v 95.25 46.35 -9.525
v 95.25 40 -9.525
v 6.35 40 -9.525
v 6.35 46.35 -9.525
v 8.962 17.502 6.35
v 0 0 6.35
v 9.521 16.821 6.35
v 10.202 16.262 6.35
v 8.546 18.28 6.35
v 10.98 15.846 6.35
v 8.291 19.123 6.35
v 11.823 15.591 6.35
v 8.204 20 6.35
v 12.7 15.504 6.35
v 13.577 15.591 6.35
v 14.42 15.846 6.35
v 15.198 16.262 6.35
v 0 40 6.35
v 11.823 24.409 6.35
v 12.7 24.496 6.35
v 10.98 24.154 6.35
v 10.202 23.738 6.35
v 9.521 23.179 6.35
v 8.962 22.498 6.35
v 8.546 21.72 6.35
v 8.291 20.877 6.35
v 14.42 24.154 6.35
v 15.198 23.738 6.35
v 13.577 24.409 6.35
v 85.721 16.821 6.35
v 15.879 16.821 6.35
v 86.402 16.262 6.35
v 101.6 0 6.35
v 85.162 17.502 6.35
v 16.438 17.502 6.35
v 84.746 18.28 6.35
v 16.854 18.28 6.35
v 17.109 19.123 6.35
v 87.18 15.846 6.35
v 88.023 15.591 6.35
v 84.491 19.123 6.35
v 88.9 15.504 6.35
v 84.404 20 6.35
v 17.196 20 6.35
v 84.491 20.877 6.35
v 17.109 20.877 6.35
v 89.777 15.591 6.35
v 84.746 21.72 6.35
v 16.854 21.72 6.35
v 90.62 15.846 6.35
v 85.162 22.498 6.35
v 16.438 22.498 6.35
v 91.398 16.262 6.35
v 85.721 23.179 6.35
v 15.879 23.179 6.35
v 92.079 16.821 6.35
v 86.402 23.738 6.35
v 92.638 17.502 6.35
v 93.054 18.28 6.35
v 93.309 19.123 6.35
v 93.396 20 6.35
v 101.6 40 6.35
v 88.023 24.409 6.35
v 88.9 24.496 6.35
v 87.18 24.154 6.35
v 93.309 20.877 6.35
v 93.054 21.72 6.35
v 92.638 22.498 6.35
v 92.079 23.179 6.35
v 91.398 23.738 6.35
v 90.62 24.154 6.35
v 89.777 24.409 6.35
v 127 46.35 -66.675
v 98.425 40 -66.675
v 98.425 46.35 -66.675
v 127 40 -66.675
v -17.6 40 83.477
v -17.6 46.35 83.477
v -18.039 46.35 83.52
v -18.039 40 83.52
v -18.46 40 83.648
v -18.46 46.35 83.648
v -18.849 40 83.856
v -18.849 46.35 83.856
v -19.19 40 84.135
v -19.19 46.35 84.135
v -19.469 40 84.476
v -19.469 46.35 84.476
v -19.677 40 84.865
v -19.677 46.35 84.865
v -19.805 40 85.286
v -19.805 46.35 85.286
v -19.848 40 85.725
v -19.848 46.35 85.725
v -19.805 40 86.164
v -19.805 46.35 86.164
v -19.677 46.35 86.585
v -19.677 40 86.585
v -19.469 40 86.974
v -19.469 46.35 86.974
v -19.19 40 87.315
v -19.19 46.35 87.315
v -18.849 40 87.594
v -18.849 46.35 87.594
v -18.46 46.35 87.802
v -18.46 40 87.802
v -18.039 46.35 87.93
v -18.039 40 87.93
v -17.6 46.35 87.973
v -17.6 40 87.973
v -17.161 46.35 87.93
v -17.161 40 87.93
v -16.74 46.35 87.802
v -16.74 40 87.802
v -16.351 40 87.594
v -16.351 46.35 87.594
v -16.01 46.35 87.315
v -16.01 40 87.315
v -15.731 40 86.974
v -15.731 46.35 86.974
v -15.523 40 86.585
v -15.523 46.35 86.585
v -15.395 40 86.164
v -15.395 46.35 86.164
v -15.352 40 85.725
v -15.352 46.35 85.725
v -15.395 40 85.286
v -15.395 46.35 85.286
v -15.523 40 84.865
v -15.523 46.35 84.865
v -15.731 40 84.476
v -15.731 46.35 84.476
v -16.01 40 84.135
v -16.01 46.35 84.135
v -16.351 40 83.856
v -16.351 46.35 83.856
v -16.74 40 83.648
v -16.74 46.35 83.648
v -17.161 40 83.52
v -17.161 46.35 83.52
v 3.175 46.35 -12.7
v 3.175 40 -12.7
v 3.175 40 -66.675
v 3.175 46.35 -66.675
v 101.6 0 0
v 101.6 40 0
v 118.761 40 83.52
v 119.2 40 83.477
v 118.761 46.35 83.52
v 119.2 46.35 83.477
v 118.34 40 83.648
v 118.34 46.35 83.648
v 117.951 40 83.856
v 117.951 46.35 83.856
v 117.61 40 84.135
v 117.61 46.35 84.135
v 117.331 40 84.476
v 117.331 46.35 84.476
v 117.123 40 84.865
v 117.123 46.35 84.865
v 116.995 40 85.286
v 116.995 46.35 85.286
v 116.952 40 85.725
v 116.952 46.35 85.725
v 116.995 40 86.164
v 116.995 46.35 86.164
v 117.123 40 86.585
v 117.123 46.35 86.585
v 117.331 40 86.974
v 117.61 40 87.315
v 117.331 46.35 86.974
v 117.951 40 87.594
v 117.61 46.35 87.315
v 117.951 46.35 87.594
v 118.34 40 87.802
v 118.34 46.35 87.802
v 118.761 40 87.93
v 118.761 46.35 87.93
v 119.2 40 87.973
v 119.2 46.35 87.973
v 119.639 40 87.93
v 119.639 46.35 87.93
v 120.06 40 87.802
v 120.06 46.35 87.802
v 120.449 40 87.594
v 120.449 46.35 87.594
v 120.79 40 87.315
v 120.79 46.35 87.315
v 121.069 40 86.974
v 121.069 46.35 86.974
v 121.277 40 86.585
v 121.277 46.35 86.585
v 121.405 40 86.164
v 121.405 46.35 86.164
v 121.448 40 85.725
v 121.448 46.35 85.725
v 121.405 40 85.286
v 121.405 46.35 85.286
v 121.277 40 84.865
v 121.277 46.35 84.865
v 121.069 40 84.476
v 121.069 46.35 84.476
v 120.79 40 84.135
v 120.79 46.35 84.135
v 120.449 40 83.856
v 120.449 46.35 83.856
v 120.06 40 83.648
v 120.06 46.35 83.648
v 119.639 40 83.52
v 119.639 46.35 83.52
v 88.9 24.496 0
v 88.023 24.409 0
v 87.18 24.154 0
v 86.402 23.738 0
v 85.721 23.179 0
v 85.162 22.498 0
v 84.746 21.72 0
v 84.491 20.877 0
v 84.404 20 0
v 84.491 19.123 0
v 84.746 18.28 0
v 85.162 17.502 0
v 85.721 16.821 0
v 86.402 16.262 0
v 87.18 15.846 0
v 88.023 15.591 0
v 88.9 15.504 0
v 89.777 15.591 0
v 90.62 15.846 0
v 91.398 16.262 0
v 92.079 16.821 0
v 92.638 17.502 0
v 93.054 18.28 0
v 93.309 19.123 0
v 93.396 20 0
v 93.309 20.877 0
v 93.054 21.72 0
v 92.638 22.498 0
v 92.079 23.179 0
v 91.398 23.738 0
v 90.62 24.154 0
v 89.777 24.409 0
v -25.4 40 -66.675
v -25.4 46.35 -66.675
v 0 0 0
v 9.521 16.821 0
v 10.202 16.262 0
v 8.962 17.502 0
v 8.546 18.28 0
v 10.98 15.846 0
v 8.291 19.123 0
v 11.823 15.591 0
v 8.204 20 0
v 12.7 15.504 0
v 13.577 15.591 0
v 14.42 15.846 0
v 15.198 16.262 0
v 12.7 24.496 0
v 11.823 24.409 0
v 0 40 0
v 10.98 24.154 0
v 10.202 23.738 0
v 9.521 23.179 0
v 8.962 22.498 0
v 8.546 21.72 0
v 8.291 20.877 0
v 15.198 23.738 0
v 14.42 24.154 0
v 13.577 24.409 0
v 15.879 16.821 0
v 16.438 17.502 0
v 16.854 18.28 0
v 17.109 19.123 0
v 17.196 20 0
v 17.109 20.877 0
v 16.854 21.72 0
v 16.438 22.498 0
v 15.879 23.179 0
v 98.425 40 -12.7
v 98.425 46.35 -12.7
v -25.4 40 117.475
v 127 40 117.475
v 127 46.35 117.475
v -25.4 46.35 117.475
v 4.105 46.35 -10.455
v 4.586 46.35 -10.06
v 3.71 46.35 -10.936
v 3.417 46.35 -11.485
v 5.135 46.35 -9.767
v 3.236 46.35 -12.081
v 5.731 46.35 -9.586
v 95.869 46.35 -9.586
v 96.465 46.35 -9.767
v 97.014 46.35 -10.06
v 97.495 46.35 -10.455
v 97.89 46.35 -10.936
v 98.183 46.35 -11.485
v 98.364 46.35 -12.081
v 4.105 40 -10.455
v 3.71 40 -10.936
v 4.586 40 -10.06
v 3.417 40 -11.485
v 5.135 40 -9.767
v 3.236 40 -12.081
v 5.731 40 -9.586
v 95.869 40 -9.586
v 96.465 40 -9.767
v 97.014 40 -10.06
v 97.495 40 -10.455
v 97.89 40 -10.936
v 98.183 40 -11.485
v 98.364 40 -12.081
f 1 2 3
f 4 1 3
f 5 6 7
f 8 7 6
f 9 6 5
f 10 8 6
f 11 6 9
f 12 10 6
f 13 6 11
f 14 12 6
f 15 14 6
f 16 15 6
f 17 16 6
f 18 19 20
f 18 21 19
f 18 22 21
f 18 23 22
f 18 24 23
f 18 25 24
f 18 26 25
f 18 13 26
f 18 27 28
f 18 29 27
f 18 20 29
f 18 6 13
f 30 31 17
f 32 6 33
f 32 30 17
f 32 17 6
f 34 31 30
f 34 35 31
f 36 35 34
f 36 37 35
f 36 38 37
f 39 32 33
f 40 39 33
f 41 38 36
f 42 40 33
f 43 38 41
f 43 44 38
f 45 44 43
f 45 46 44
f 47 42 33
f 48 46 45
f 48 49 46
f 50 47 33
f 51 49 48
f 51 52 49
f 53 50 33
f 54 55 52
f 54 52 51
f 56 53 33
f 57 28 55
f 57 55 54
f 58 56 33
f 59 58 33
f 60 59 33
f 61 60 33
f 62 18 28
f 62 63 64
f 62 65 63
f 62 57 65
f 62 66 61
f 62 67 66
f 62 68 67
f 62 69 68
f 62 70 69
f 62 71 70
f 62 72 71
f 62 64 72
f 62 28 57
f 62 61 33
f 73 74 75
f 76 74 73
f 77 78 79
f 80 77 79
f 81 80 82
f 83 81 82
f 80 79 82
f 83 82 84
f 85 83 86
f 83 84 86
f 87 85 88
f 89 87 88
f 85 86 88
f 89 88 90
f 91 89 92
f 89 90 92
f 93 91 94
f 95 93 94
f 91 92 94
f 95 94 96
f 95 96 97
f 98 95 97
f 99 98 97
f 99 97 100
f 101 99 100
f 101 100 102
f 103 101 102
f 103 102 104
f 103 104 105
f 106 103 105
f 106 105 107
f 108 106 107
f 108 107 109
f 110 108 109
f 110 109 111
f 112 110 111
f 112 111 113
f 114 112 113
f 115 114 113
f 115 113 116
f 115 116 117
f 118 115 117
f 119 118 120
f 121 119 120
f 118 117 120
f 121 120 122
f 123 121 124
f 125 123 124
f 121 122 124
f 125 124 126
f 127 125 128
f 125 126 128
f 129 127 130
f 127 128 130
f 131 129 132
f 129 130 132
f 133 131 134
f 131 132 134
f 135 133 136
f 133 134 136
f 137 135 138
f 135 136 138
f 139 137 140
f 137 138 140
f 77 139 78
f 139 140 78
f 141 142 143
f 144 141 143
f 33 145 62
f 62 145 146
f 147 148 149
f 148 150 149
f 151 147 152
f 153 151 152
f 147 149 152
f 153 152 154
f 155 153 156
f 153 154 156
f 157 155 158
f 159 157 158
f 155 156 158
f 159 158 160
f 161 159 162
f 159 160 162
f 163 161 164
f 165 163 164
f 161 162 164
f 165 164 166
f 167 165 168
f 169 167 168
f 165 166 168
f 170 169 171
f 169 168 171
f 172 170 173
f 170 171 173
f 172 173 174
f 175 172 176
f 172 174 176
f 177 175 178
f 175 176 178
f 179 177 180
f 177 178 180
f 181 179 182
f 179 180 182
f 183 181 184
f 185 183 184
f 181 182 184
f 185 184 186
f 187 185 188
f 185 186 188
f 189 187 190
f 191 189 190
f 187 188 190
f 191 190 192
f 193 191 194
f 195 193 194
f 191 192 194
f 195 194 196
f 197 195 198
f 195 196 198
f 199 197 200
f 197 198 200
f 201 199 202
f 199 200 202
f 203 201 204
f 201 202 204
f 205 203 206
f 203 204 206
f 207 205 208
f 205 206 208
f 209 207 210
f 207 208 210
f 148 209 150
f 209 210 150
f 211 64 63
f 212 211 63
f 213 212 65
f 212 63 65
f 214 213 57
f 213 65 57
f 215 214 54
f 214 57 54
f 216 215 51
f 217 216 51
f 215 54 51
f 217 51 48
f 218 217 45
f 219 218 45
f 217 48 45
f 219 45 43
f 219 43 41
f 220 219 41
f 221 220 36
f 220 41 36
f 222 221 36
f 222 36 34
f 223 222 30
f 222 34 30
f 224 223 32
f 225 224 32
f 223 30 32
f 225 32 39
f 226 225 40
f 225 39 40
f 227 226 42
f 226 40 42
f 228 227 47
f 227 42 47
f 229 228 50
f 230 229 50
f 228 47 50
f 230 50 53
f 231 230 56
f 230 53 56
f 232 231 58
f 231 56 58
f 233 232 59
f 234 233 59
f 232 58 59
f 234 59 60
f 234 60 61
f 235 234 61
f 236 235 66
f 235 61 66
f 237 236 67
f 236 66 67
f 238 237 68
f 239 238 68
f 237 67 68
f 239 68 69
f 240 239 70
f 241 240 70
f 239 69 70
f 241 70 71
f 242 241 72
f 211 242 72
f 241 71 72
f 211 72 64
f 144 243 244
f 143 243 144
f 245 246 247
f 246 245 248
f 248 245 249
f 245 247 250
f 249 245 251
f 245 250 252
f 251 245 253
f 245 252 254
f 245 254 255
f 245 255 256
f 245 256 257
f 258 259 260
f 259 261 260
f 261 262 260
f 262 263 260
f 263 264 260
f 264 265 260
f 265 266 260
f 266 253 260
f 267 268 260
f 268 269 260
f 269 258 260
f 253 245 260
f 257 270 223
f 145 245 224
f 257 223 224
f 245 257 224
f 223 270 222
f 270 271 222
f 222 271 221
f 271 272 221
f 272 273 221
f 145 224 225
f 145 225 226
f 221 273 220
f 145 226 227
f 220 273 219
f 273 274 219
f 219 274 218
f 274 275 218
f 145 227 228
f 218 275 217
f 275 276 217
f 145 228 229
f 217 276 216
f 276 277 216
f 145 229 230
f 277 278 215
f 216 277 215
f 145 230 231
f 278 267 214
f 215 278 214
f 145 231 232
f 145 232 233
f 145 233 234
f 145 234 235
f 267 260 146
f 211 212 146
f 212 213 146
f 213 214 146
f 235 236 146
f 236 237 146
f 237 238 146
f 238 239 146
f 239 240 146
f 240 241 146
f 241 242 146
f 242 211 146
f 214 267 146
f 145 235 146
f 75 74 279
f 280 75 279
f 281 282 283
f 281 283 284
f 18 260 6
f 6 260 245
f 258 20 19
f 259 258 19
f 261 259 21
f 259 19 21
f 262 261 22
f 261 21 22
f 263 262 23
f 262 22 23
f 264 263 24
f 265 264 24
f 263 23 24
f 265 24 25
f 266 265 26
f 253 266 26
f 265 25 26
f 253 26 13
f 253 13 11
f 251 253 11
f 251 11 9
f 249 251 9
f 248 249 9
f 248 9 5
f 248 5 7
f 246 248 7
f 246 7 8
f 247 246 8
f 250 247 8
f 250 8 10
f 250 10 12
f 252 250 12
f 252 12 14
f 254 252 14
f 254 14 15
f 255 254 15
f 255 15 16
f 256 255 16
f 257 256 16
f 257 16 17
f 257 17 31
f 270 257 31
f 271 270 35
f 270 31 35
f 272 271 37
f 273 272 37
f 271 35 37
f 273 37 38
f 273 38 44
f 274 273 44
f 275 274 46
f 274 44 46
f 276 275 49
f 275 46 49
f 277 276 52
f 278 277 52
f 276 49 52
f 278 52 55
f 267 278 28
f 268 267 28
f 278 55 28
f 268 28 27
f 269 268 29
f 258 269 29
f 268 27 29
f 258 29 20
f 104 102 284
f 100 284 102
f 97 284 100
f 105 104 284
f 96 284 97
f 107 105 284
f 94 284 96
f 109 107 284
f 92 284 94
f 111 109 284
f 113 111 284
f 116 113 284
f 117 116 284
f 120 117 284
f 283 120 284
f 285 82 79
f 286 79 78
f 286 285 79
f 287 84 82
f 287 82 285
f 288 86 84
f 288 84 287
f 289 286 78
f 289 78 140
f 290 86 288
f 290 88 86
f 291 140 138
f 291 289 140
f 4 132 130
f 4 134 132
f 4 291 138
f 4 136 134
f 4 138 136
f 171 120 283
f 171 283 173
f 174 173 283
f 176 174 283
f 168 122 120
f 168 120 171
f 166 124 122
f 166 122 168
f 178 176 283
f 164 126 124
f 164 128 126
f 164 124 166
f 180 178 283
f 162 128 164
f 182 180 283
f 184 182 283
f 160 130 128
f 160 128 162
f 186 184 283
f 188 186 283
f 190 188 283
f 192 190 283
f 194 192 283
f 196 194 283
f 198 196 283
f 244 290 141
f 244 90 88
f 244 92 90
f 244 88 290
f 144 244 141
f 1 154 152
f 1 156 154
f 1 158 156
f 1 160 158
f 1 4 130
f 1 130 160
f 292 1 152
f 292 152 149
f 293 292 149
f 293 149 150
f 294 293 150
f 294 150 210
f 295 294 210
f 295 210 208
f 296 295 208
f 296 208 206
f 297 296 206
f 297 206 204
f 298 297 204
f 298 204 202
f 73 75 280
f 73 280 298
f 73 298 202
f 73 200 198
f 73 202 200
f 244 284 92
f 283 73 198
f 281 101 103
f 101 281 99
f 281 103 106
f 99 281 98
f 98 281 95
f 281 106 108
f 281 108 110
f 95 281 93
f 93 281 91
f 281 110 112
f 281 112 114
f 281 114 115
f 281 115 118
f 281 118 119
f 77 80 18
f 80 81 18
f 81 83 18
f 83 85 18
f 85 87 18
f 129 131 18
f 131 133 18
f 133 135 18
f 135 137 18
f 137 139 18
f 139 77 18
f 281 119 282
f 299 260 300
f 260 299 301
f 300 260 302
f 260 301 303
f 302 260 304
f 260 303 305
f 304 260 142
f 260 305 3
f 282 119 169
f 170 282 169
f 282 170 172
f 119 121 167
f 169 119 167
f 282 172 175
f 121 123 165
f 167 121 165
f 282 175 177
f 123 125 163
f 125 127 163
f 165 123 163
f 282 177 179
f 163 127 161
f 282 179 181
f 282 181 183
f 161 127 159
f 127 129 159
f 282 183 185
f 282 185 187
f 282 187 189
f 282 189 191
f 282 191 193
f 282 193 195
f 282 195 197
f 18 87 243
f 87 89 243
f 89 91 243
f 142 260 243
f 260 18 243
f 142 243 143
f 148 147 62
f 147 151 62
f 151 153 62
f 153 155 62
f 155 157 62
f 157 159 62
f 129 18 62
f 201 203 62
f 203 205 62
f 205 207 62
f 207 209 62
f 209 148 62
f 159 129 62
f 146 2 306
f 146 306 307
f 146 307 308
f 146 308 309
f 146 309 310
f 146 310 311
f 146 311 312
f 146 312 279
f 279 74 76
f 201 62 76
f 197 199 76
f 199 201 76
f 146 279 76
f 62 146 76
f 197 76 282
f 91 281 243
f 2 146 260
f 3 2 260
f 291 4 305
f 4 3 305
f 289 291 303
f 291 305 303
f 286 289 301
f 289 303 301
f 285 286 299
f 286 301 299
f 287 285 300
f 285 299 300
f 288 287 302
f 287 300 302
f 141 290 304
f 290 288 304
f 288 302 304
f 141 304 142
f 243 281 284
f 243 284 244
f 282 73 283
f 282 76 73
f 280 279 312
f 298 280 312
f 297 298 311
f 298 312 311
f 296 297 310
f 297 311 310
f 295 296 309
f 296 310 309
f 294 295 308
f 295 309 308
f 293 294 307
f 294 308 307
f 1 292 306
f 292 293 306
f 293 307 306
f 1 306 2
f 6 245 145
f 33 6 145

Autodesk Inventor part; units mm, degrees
ref_plane "YZ Plane" through (0, 0, 0) normal (1, 0, 0) x (0, 1, 0)
ref_plane "XZ Plane" through (0, 0, 0) normal (0, 1, 0) x (-1, 0, 0)
ref_plane "XY Plane" through (0, 0, 0) normal (0, 0, 1) x (1, 0, 0)
sketch "Sketch1" plane through (0, 0, 0) normal (0, 0, 1) x (1, 0, 0)
  line L0 (0, 0) -> (101.6, 0)
  line L1 (101.6, 0) -> (101.6, 40)
  line L2 (101.6, 40) -> (0, 40)
  line L3 (0, 40) -> (0, 0)
  dimension "d0" = 101.6
  dimension "d1" = 40
extrude "Mounting Plate" add sketch "Sketch1" along normal blind 6.35
sketch "Sketch2" plane through (0, 40, 0) normal (0, 1, 0) x (1, 0, 0)
  line L0 (0, -6.35) -> (101.6, -6.35) projected
  line L1 (101.6, 0) -> (101.6, -6.35) projected
  line L2 (101.6, 0) -> (0, 0) projected
  line L3 (0, 0) -> (0, -6.35) projected
  line L4 (-25.4, 66.675) -> (127, 66.675)
  line L5 (127, 66.675) -> (127, -117.475)
  line L6 (127, -117.475) -> (-25.4, -117.475)
  line L7 (-25.4, -117.475) -> (-25.4, 66.675)
  line L8 (3.175, 66.675) -> (98.425, 66.675)
  line L9 (98.425, 66.675) -> (98.425, 12.7)
  line L10 (95.25, 9.525) -> (6.35, 9.525)
  line L11 (3.175, 12.7) -> (3.175, 66.675)
  arc A0 (3.175, 12.7) -> (6.35, 9.525) centre (6.35, 12.7) ccw
  arc A1 (95.25, 9.525) -> (98.425, 12.7) centre (95.25, 12.7) ccw
  point P0 (98.425, 9.525)
  point P1 (3.175, 9.525)
  point P2 (50.8, 66.675)
  point P3 (50.8, 0)
  point P4 (50.8, 9.525)
  dimension "d4" = 152.4
  dimension "d5" = 184.15
  dimension "d6" = 95.25
  dimension "d7" = 57.15
  dimension "d8" = 9.525
  dimension "d9" = 3.175
extrude "Back Plate" add sketch "Sketch2" along normal blind 6.35 contours L3 L2 L1 L0 | L4 L11 A0 L10 A1 L9 L5 L6 L7
sketch "Sketch3" plane through (0, 0, 0) normal (0, 0, -1) x (-1, 0, 0)
  line L0 (0, 0) -> (-101.6, 0) projected
  line L1 (-101.6, 0) -> (-101.6, 40) projected
  line L2 (-88.9, 20) -> (-12.7, 20)
  line L3 (-6.35, 40) -> (-95.25, 40) projected
  point P0 (-50.8, 20)
  point P1 (-50.8, 40)
  dimension "d12" = 76.2
  dimension "d13" = 20
hole "Hole1" at (88.9, 20, 0) at (12.7, 20, 0) direction (0, 0, 1) diameter 8.9916 end through all clearance for "Flat Head Machine Screw" size "M8" standard "Ansi Metric M Profile"
sketch "Sketch4" plane through (0, 40, 0) normal (0, -1, 0) x (1, 0, 0)
  line L0 (-25.4, 117.475) -> (127, 117.475) projected
  line L1 (0, 6.35) -> (101.6, 6.35) projected
  line L2 (-17.6, 85.725) -> (119.2, 85.725)
  point P0 (50.8, 85.725)
  point P1 (50.8, 117.475)
  dimension "d21" = 136.8
  dimension "d22" = 31.75
hole "Hole2" at (-17.6, 40, 85.725) at (119.2, 40, 85.725) direction (0, 1, 0) diameter 4.4958 end through all clearance for "Flat Head Machine Screw" size "M4" standard "Ansi Metric M Profile"
properties part number "LIDAR Bracket"
